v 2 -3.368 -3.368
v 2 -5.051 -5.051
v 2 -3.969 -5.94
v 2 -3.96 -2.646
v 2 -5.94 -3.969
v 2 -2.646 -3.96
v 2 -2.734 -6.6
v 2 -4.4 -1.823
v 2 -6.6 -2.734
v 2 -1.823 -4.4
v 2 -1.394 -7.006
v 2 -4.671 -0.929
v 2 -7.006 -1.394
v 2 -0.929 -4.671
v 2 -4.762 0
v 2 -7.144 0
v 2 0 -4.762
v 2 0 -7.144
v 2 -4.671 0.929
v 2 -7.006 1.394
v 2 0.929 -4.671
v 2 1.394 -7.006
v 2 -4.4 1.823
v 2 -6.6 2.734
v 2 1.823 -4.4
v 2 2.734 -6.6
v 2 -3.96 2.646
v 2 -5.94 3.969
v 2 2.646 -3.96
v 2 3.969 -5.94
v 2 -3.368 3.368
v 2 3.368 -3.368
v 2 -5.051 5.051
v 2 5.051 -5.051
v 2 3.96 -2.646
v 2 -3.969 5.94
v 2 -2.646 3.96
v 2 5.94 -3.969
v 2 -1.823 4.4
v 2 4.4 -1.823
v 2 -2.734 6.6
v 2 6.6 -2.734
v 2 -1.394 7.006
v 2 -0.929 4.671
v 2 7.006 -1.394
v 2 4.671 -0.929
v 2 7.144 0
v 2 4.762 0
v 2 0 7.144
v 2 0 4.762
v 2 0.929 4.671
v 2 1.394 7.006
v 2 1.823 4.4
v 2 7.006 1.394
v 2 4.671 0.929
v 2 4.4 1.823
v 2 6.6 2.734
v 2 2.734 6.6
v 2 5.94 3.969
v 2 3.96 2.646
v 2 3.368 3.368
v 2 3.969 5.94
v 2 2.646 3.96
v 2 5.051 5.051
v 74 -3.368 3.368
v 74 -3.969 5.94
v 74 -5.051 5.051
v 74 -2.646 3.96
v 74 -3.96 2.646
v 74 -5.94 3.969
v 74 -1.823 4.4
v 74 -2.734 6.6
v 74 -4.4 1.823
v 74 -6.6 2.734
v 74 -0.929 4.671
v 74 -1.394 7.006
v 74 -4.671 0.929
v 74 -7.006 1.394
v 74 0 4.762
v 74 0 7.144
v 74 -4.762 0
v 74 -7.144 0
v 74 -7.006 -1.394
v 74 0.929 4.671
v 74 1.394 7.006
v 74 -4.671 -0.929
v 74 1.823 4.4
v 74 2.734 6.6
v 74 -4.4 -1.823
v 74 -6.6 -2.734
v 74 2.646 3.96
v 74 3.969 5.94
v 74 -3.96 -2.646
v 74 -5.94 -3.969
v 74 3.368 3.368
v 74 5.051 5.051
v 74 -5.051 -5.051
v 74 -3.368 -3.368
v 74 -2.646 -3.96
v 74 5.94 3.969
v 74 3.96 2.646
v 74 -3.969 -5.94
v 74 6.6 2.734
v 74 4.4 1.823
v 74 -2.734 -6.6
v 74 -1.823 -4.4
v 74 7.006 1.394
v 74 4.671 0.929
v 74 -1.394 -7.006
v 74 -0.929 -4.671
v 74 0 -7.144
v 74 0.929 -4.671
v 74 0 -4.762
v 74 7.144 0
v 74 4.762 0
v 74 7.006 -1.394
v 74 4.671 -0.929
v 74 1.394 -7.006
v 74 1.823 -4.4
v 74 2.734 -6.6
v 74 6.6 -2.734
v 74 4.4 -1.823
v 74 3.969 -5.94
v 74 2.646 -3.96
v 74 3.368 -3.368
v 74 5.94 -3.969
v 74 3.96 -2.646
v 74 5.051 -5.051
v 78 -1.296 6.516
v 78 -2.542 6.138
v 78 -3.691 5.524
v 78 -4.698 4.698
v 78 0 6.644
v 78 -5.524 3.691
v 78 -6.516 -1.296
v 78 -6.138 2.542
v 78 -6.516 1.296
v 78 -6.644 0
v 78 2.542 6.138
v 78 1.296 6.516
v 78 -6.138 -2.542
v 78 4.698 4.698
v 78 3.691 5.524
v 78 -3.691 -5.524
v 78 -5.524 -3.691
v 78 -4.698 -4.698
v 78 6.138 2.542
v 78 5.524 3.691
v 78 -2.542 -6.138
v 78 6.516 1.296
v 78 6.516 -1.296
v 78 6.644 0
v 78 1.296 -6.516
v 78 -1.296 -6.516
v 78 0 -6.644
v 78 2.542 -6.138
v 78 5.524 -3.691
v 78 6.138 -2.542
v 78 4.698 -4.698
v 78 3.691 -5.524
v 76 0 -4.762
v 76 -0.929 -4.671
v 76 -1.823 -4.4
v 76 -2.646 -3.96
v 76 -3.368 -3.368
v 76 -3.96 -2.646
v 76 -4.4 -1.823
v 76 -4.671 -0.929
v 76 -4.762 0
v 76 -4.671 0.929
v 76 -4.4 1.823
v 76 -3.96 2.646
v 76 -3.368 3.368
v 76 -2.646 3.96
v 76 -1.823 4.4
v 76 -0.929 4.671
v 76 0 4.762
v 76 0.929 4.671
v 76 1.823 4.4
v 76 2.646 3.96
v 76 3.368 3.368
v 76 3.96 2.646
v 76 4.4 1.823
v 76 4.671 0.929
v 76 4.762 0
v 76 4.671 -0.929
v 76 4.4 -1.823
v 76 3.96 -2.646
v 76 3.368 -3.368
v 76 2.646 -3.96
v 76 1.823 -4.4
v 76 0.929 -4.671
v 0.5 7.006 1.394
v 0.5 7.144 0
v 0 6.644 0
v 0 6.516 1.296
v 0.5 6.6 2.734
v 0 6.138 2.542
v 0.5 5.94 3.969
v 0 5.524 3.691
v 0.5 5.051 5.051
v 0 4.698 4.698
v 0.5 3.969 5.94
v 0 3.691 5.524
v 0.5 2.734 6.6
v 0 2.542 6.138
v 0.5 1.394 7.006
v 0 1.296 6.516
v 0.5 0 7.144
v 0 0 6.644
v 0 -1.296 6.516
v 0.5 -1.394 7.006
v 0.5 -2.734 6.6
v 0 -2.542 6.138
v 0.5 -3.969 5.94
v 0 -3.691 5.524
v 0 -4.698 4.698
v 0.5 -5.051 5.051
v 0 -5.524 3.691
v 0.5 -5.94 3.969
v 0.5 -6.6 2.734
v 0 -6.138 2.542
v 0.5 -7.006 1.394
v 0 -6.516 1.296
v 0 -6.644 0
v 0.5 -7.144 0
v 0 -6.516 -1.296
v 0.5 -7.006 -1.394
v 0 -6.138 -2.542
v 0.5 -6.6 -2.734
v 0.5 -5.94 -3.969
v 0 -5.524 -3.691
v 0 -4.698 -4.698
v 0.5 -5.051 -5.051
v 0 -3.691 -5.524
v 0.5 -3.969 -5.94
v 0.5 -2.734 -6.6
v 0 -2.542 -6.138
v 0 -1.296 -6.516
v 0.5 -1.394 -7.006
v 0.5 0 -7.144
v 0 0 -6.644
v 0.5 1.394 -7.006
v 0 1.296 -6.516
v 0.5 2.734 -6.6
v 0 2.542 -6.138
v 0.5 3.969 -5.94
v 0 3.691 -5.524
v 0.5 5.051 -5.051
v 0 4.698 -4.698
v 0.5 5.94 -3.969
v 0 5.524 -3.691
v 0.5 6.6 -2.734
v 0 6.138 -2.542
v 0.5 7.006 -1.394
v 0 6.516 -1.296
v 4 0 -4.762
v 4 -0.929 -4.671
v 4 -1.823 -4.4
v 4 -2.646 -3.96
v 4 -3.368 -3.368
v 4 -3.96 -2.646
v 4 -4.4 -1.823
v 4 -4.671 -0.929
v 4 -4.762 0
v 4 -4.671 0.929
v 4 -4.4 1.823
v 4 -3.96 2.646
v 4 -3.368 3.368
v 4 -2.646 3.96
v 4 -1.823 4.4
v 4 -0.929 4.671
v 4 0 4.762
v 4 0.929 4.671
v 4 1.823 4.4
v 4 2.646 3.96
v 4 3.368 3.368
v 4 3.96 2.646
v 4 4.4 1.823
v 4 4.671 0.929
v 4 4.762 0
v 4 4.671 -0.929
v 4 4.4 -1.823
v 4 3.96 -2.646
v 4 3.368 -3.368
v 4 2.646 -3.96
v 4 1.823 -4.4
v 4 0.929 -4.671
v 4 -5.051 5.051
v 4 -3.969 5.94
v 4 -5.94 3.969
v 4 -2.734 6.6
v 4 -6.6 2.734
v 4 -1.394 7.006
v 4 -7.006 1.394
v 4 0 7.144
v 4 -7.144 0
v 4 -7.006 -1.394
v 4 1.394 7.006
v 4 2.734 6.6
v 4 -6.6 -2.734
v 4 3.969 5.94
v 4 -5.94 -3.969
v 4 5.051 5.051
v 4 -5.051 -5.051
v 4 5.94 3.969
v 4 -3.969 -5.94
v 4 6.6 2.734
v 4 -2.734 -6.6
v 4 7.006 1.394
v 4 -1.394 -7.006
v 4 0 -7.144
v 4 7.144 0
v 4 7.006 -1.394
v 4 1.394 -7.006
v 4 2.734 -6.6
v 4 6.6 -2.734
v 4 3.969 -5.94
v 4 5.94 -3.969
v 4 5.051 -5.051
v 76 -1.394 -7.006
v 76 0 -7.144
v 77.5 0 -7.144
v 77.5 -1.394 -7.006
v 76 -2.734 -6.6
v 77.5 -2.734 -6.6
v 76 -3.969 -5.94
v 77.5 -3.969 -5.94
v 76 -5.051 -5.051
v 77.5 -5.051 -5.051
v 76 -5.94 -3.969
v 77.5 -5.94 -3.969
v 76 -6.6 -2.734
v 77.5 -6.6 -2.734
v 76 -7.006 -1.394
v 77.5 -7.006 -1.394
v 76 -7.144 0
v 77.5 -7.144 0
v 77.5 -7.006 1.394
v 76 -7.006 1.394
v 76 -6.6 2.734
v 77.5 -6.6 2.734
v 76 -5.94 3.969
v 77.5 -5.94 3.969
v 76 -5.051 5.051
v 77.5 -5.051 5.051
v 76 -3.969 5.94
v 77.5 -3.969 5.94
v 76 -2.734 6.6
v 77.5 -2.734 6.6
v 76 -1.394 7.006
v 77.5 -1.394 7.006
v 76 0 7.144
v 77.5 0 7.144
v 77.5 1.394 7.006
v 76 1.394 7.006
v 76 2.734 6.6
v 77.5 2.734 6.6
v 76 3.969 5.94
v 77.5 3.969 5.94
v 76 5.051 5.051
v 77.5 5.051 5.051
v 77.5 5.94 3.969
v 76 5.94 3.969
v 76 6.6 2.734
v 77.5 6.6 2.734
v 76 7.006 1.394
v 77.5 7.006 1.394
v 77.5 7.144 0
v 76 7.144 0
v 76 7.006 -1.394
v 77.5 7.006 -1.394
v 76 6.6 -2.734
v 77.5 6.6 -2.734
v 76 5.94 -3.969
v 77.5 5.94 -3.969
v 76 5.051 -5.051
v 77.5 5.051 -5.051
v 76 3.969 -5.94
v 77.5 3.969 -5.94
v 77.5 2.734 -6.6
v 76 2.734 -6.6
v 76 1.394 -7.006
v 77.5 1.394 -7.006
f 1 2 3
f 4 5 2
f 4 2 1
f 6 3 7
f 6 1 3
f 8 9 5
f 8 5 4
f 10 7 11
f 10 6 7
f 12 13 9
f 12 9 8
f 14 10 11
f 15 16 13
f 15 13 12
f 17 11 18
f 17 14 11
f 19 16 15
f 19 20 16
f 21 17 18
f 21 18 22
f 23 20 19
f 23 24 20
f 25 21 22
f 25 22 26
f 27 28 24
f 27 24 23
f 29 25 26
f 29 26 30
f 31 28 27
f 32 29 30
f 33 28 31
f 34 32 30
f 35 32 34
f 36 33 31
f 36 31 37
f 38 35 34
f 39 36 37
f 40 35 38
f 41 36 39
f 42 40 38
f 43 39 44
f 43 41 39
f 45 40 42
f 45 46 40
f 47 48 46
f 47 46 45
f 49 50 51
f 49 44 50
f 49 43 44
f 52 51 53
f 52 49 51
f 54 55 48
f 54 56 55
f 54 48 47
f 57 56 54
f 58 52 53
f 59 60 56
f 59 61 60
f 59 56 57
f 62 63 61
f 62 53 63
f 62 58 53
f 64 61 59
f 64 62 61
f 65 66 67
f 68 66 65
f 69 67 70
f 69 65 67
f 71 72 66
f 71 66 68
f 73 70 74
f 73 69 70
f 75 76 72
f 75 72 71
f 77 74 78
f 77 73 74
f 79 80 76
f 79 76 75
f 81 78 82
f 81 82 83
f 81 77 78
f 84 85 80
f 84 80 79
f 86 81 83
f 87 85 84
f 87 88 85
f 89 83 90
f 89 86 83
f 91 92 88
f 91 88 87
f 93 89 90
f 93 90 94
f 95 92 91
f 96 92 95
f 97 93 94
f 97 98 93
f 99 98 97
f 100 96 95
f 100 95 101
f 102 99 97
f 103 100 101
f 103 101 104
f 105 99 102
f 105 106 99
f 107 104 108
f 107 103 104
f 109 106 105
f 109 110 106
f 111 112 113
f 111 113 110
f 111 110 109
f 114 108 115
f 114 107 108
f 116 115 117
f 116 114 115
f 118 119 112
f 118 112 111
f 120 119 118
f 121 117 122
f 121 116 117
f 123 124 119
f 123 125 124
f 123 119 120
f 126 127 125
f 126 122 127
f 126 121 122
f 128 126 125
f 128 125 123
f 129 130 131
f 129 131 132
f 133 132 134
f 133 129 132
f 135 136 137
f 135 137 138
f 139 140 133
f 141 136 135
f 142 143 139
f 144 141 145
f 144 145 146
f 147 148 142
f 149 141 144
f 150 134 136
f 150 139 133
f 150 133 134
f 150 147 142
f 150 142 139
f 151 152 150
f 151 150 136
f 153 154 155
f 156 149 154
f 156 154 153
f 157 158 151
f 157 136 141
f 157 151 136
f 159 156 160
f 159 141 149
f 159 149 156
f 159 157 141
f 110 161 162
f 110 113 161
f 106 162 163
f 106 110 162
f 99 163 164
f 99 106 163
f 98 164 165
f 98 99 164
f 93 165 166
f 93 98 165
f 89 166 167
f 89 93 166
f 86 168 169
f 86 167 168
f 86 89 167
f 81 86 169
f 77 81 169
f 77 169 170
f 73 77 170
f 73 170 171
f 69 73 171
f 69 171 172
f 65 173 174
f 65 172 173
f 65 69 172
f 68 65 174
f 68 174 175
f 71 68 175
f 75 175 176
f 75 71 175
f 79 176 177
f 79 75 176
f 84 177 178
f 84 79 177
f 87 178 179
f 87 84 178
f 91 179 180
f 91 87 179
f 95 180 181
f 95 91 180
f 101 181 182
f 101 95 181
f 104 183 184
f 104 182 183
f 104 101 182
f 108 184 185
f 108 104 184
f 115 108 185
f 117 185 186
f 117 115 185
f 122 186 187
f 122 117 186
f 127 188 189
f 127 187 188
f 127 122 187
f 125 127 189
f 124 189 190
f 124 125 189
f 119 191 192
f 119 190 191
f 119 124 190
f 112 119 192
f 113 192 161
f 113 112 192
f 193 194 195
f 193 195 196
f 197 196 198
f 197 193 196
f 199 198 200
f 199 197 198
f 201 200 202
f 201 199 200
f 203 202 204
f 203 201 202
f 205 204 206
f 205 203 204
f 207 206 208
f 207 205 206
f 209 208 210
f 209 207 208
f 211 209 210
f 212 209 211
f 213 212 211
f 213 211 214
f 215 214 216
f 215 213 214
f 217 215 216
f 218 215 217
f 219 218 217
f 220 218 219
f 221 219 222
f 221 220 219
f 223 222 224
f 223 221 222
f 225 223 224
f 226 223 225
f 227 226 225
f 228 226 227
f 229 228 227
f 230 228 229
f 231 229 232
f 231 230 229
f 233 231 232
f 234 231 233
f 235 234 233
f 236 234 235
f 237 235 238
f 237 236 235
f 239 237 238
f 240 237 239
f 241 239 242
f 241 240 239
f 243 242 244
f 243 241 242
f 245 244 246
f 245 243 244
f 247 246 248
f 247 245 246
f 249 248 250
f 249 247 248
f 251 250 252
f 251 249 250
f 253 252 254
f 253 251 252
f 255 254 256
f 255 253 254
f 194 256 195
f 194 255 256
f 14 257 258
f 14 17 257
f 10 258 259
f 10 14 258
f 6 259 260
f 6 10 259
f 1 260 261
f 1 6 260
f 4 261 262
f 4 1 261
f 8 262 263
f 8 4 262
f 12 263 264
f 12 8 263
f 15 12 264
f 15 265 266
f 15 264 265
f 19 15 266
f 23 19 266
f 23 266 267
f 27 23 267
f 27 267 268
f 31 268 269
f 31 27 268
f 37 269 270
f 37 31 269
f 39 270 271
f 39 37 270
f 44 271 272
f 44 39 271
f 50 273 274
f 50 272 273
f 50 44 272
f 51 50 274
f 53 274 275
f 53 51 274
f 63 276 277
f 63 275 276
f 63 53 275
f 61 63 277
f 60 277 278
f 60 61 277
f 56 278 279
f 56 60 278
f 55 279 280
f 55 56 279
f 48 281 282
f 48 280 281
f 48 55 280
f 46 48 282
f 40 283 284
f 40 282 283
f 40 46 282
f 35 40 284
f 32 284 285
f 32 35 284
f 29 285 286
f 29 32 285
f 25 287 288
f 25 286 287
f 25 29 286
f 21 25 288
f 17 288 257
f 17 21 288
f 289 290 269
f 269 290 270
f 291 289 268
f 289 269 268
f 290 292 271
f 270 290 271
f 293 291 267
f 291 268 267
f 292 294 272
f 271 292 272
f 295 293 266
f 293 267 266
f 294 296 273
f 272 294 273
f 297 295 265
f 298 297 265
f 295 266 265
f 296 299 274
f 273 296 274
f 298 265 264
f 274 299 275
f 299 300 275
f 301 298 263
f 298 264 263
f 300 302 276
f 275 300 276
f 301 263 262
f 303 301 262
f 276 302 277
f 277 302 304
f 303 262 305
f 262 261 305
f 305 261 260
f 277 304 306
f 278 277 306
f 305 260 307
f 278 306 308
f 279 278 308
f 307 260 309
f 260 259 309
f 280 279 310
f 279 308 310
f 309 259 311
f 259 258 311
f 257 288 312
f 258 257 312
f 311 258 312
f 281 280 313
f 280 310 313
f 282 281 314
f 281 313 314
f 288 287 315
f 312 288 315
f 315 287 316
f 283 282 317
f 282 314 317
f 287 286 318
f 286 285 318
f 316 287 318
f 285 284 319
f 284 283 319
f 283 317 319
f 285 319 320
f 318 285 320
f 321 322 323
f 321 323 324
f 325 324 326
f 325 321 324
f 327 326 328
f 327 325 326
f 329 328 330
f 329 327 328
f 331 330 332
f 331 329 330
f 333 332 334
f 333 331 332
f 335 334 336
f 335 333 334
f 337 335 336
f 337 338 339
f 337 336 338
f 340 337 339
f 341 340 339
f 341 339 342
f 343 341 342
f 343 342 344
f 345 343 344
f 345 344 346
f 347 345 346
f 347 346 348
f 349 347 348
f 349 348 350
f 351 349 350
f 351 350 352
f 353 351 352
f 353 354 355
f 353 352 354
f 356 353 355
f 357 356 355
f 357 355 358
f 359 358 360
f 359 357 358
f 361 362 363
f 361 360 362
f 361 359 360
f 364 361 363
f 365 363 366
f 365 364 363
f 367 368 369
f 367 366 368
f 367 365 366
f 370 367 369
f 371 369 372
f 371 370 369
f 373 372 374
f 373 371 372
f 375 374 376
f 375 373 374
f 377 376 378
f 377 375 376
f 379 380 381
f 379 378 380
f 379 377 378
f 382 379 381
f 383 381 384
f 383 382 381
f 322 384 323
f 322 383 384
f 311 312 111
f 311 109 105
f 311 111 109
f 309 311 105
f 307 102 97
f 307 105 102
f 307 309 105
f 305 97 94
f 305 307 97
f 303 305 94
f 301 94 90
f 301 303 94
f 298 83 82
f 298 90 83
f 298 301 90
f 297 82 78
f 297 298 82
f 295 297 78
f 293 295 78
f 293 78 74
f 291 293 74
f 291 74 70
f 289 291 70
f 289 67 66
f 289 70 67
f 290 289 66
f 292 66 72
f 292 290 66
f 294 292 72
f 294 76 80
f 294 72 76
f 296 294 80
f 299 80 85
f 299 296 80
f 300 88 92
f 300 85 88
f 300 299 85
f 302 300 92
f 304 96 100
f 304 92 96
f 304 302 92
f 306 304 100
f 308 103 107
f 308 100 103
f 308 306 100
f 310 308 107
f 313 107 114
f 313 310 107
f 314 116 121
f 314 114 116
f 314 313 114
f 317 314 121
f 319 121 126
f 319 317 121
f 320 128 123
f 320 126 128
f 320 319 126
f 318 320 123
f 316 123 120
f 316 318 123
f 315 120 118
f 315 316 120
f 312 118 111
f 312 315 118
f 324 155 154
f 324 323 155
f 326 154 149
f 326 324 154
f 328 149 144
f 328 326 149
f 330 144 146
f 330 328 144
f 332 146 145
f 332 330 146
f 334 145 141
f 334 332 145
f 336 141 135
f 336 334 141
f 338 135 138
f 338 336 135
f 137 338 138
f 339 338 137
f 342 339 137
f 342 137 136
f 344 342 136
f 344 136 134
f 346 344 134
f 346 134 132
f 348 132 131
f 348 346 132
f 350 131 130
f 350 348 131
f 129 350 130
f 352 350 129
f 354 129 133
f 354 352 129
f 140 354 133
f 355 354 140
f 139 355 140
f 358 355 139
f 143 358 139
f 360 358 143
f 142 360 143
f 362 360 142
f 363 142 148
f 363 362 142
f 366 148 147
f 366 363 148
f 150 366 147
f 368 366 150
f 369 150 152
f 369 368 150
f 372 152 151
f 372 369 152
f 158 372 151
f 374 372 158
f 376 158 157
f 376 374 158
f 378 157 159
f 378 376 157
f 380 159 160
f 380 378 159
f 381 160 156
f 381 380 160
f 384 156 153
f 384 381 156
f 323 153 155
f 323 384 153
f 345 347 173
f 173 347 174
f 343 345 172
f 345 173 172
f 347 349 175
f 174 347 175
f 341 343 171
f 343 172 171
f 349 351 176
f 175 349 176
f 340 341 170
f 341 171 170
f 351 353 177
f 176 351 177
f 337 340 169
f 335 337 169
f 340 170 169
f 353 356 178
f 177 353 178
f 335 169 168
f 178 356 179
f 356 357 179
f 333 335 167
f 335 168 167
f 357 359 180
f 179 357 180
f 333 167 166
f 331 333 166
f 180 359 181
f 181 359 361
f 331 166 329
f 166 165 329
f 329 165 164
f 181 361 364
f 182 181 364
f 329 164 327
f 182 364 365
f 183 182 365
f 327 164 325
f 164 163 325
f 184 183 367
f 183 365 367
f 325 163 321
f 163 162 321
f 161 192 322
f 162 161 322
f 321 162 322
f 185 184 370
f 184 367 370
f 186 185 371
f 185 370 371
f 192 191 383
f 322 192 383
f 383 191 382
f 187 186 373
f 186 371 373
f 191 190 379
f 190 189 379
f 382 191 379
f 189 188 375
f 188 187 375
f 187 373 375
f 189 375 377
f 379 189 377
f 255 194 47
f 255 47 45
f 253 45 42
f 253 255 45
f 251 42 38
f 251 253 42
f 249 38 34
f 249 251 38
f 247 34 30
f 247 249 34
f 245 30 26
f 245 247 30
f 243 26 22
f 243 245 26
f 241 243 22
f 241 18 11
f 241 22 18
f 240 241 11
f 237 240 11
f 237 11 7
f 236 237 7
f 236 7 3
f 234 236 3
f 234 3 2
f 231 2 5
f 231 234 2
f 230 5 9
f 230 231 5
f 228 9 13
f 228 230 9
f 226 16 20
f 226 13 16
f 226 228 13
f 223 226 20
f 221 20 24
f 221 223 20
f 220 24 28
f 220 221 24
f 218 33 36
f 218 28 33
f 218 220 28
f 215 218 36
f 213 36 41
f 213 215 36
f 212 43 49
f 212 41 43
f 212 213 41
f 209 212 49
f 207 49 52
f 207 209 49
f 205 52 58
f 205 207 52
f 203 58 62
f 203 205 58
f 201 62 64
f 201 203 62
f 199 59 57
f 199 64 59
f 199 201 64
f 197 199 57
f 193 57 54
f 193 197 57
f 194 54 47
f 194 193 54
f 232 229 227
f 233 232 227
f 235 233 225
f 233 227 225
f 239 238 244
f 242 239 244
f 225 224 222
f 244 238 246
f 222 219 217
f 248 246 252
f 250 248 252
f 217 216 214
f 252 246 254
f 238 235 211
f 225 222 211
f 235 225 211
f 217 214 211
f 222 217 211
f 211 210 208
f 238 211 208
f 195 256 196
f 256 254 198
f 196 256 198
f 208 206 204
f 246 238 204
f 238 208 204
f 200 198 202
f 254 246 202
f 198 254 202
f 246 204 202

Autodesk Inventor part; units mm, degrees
ref_plane "YZ Plane" through (0, 0, 0) normal (1, 0, 0) x (0, 1, 0)
ref_plane "XZ Plane" through (0, 0, 0) normal (0, 1, 0) x (-1, 0, 0)
ref_plane "XY Plane" through (0, 0, 0) normal (0, 0, 1) x (1, 0, 0)
sketch "Esboço2" plane through (0, 0, 0) normal (1, 0, 0) x (0, 1, 0)
  circle A0 centre (0, 0) radius 7.1437
  dimension "d0" = 14.2875
extrude "Extrusão1" add sketch "Esboço2" along normal blind 2
sketch "Esboço3" plane through (2, 0, 0) normal (1, 0, 0) x (0, 0, -1)
  circle A0 centre (0, 0) radius 7.1437 projected
  circle A1 centre (0, 0) radius 4.7625
  dimension "d3" = 9.525
extrude "Extrusão2" add sketch "Esboço3" along normal blind 2 contours A1
sketch "Esboço4" plane through (4, 0, 0) normal (1, 0, 0) x (0, 0, -1)
  circle A0 centre (0, 0) radius 4.7625 projected
  circle A1 centre (0, 0) radius 7.1437
  dimension "d6" = 14.2875
extrude "Extrusão3" add sketch "Esboço4" along normal blind 70 contours A0 | A1
sketch "Esboço5" plane through (74, 0, 0) normal (1, 0, 0) x (0, 0, -1)
  circle A0 centre (0, 0) radius 7.1437 projected
  circle A1 centre (0, 0) radius 4.7625
  dimension "d9" = 9.525
extrude "Extrusão4" add sketch "Esboço5" along normal blind 2 contours A1
sketch "Esboço6" plane through (76, 0, 0) normal (1, 0, 0) x (0, 0, -1)
  circle A0 centre (0, 0) radius 4.7625 projected
  circle A1 centre (0, 0) radius 7.1437
  dimension "d12" = 14.2875
extrude "Extrusão5" add sketch "Esboço6" along normal blind 2 contours A0 | A1
chamfer "Chanfro1" distance 0.5 angle 45 2 edges at (0, -7.1437, 0) (78, 0, 7.1437)
properties part number "pino_a3" material "Aço carbono"
